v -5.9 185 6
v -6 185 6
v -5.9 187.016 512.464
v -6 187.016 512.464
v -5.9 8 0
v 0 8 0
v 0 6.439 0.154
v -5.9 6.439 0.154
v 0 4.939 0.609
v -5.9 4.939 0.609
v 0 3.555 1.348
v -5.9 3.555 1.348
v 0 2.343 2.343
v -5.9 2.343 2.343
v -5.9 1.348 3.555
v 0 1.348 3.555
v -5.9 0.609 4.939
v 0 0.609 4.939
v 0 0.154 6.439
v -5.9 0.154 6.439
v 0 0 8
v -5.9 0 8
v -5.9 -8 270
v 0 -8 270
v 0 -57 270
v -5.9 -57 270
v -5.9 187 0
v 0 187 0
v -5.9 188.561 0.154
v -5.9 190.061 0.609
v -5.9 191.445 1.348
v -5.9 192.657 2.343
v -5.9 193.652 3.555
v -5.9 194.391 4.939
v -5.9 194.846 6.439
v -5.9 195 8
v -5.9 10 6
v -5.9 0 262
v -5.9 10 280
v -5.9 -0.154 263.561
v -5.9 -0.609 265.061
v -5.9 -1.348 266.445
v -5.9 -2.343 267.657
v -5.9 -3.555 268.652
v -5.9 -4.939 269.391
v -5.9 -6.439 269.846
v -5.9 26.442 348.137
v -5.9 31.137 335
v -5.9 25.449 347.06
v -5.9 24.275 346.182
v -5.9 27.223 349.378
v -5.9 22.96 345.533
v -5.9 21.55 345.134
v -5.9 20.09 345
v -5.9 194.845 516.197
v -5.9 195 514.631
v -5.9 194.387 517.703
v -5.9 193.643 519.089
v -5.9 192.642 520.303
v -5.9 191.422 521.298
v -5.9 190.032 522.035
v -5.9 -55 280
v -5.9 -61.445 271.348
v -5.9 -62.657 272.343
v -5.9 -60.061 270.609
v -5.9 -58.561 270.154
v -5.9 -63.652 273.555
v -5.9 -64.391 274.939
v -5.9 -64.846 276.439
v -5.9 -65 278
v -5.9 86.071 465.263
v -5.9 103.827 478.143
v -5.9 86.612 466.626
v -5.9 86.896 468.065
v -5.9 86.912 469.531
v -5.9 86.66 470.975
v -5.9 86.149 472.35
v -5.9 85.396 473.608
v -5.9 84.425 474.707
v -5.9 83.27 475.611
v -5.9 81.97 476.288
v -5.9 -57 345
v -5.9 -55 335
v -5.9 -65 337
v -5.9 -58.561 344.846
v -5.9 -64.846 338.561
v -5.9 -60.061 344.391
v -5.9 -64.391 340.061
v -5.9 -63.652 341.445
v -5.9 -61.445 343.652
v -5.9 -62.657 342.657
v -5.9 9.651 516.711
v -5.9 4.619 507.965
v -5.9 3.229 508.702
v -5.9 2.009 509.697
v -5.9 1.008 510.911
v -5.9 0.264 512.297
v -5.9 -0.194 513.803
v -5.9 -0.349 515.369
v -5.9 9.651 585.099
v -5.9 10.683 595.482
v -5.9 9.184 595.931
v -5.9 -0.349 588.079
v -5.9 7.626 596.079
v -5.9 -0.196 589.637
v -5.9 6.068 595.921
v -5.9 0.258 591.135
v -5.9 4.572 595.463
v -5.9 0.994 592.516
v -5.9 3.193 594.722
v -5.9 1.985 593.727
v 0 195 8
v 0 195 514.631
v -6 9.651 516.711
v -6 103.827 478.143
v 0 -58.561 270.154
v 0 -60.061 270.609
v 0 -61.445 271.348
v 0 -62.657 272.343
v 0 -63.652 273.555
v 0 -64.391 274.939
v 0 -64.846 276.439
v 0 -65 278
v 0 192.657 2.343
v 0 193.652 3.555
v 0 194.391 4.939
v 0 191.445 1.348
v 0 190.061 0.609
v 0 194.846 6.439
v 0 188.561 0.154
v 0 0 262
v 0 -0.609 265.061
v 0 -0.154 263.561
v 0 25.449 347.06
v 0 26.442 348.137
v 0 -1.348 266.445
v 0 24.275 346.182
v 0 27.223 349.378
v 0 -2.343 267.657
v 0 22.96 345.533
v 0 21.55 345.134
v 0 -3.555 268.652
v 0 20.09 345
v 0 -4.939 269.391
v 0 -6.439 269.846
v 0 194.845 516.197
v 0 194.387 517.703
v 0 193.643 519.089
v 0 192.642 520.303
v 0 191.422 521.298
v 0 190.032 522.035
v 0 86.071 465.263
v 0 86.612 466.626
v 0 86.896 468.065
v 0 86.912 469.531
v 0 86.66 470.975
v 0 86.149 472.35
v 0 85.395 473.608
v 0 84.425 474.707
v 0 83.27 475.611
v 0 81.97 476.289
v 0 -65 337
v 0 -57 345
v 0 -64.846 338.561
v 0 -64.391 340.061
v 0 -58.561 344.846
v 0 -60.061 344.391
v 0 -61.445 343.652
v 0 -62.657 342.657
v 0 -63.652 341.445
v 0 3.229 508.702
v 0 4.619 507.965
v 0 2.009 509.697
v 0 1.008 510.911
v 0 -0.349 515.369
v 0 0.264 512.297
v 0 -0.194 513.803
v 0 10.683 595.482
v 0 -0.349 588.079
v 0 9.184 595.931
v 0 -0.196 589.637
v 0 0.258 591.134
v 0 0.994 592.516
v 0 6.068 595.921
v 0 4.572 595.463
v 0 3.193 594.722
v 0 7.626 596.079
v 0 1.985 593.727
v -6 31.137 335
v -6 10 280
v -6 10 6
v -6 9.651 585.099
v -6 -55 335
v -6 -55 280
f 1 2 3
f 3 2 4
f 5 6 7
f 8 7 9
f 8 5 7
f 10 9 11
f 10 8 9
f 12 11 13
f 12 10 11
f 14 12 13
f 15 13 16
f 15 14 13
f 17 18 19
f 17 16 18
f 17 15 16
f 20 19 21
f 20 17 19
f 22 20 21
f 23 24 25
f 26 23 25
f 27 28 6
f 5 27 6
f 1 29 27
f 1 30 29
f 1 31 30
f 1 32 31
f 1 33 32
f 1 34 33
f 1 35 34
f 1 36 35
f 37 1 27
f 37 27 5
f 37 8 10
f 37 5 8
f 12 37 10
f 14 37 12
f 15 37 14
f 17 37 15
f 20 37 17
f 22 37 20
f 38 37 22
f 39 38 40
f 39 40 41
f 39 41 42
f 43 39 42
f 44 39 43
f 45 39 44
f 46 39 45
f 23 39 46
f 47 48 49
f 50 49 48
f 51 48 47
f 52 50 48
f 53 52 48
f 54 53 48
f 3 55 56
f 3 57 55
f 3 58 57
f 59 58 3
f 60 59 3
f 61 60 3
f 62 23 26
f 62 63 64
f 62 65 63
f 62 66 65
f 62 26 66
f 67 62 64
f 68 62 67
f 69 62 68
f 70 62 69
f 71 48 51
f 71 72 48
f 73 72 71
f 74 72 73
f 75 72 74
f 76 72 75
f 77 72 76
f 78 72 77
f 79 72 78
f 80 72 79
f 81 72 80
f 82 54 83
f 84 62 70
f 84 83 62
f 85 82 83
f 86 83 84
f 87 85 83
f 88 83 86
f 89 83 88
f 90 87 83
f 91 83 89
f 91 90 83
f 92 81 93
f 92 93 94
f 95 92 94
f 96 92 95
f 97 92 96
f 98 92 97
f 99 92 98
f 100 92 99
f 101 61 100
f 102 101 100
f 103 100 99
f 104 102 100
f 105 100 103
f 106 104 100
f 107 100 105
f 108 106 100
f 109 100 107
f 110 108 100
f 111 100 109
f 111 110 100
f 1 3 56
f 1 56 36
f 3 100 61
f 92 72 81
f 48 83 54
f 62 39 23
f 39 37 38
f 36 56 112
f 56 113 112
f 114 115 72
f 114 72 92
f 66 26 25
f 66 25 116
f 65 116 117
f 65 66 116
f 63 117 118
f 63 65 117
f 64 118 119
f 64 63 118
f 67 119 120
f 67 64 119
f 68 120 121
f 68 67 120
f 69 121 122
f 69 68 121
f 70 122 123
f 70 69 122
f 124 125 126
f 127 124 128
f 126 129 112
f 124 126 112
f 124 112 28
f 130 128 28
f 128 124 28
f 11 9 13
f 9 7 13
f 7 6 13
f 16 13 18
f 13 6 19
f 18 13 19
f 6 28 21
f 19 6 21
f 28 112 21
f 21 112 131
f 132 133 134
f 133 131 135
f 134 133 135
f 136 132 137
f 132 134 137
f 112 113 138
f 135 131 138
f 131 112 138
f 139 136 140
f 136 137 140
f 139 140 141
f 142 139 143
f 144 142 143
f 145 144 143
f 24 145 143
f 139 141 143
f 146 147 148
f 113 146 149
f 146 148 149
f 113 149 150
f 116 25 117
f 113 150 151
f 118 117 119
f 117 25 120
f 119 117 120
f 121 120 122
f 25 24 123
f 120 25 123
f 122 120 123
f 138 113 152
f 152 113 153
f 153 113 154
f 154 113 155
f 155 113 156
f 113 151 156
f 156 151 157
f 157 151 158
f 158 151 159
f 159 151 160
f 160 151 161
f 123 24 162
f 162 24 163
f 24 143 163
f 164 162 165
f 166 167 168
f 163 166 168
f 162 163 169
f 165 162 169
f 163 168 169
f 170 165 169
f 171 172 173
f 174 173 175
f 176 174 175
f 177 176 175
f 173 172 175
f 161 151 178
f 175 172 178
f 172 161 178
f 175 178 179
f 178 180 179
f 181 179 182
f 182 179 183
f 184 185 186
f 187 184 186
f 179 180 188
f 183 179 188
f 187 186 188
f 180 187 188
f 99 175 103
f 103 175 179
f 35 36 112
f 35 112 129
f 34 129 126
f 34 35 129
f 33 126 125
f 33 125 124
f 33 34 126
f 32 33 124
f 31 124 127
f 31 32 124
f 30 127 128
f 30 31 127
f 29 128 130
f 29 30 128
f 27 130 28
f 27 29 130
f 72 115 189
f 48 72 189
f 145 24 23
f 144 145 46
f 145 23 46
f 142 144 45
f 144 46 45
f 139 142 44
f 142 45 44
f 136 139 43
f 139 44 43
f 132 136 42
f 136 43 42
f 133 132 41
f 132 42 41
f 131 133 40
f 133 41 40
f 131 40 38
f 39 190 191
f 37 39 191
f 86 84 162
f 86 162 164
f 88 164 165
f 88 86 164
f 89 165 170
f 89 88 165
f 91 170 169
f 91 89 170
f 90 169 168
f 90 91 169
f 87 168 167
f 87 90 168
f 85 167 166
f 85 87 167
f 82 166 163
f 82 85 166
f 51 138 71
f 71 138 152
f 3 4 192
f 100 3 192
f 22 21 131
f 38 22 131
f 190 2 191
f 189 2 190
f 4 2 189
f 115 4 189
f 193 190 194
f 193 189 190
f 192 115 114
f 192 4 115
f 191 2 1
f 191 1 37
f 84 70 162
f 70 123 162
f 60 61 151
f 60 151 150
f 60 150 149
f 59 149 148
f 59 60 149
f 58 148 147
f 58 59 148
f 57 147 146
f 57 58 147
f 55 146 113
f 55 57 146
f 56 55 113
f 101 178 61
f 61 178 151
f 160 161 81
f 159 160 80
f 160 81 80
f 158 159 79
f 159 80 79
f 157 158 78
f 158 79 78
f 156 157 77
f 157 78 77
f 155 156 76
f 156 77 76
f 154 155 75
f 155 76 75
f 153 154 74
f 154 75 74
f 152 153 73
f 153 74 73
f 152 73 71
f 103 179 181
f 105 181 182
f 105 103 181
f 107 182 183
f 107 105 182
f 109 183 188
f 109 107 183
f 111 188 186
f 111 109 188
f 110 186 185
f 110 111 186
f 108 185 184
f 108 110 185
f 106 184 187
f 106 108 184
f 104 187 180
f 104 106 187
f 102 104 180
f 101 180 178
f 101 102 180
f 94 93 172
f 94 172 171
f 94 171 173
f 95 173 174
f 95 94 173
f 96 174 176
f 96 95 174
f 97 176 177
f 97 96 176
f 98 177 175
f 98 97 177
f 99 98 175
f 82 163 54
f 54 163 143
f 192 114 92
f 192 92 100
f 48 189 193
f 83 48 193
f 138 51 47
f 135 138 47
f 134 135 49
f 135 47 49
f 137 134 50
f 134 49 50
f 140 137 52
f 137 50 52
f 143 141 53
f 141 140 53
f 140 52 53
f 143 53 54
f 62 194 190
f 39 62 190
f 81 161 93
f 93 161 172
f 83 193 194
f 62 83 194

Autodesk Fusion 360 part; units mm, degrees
sketch "Side Panel" plane through (0, 0, 0) normal (1, 0, 0) x (0, 1, 0)
  line L0 (0, 0) -> (195, 0)
  line L1 (195, 0) -> (195, 520)
  line L2 (195, 520) -> (-0.3488, 600)
  line L3 (-0.3488, 600) -> (-0.3488, 510)
  line L4 (-0.3488, 510) -> (90, 473)
  line L5 (90, 473) -> (25, 345)
  line L6 (25, 345) -> (-65, 345)
  line L7 (-65, 345) -> (-65, 270)
  line L8 (-65, 270) -> (0, 270)
  line L9 (0, 270) -> (0, 0)
  dimension "d7" = 600
  dimension "d10" = 195
  dimension "d12" = 520
  dimension "d14" = 90
  dimension "d16" = 105
  dimension "d18" = 270
  dimension "d20" = 75
  dimension "d22" = 37
  dimension "d27" = 260
  dimension "d28" = 90
  dimension "d31" = 345
extrude "Extrude1" add sketch "Side Panel" along normal blind 6 makes body 1
fillet "Fillet1" radius 8 10 edges at (3, -65, 345) (3, 25, 345) (3, 90, 473) (3, -0.3488, 510) (3, -0.3488, 600) (3, 195, 520) (3, -65, 270) (3, 0, 270) (3, 0, 0) (3, 195, 0) on bodies 1
sketch "Paint border" plane through (6, 0, 0) normal (1, 0, 0) x (0, 1, 0)
  arc A0 (187, 0) -> (195, 8) centre (187, 8) ccw
  line L0 (195, 8) -> (195, 514.6313)
  arc A1 (195, 514.6313) -> (190.0318, 522.0346) centre (187, 514.6313) ccw
  line L1 (190.0318, 522.0346) -> (10.683, 595.4822)
  arc A2 (10.683, 595.4822) -> (-0.3488, 588.079) centre (7.6512, 588.079) ccw
  line L2 (-0.3488, 588.079) -> (-0.3488, 515.3687)
  arc A3 (-0.3488, 515.3687) -> (4.6194, 507.9654) centre (7.6512, 515.3687) ccw
  line L3 (4.6194, 507.9654) -> (81.9699, 476.2885)
  arc A4 (86.0711, 465.263) -> (81.9699, 476.2885) centre (78.9381, 468.8853) ccw
  line L4 (86.0711, 465.263) -> (27.2231, 349.3778)
  arc A5 (20.0901, 345) -> (27.2231, 349.3778) centre (20.0901, 353) ccw
  line L5 (20.0901, 345) -> (-57, 345)
  arc A6 (-57, 345) -> (-65, 337) centre (-57, 337) ccw
  line L6 (-65, 337) -> (-65, 278)
  arc A7 (-65, 278) -> (-57, 270) centre (-57, 278) ccw
  line L7 (-57, 270) -> (-8, 270)
  arc A8 (0, 262) -> (-8, 270) centre (-8, 262) ccw
  line L8 (0, 262) -> (0, 8)
  arc A9 (0, 8) -> (8, 0) centre (8, 8) ccw
  line L9 (8, 0) -> (187, 0)
  line L10 (10, 6) -> (185, 6)
  line L11 (10, 6) -> (10, 280)
  line L12 (10, 280) -> (-55, 280)
  line L13 (-55, 280) -> (-55, 335)
  line L14 (-55, 335) -> (31.1374, 335)
  line L15 (9.6512, 516.7108) -> (103.8274, 478.1434)
  line L16 (31.1374, 335) -> (103.8274, 478.1434)
  line L17 (187.0159, 512.4636) -> (185, 6)
  line L18 (9.6512, 585.0987) -> (187.0159, 512.4636)
  line L19 (9.6512, 585.0987) -> (9.6512, 516.7108)
  dimension "d32" = 6
  dimension "d33" = 10
  dimension "d34" = 10
  dimension "d35" = 10
  dimension "d36" = 10
  dimension "d37" = 10
  dimension "d41" = 10
  dimension "d42" = 10
  dimension "d43" = 10
  dimension "d44" = 10
extrude "Extrude2" cut sketch "Paint border" against normal blind 0.1 bodies 1
mirror "Mirror1" about plane through (0, 0, 0) normal (1, 0, 0) of bodies 1 makes body 2
hidden bodies 1
equation "MDFThickness = 6 mm" comment "Thickness of the MDF board"
equation "filletRadius = 8 mm" comment "Radius of all of the fillets on the side panel"
equation "d3 = MDFThickness"
equation "d6 = filletRadius"
equation "d7 = totaHeight"
equation "totaHeight = 600 mm" comment "Total height of the Smartie Sorrter"
equation "baseWidth = 195 mm" comment "Length of the bottom side of the side panel"
equation "d10 = baseWidth"
equation "backHight = 520 mm" comment "Height of the back side of the side panel"
equation "d12 = backHight"
equation "namePanelHeight = 90 mm" comment "Height of the top section containing the name panel"
equation "d14 = namePanelHeight"
equation "neckWidth = 105 mm" comment "Width of the neck between the bottom and top section"
equation "d16 = neckWidth"
equation "bottomFrontHeight = 270 mm" comment "Height of the bottom front section"
equation "d18 = bottomFrontHeight"
equation "controlPanelHeight = 75 mm" comment "Height of the control panel on the front"
equation "d20 = controlPanelHeight"
equation "namePanelFrontDipHeight = 37 mm" comment "Dip height on the front side below the name panel"
equation "d22 = namePanelFrontDipHeight"
equation "controlPanelTopWidth = 90 mm" comment "Top width of the control panel from the front to the viewing area"
equation "controlPanelTotalWidth = 260 mm" comment "Total width of the control panel area from the front to the back"
equation "d27 = controlPanelTotalWidth"
equation "d28 = controlPanelTopWidth"
equation "d31 = bottomFrontHeight + controlPanelHeight"
